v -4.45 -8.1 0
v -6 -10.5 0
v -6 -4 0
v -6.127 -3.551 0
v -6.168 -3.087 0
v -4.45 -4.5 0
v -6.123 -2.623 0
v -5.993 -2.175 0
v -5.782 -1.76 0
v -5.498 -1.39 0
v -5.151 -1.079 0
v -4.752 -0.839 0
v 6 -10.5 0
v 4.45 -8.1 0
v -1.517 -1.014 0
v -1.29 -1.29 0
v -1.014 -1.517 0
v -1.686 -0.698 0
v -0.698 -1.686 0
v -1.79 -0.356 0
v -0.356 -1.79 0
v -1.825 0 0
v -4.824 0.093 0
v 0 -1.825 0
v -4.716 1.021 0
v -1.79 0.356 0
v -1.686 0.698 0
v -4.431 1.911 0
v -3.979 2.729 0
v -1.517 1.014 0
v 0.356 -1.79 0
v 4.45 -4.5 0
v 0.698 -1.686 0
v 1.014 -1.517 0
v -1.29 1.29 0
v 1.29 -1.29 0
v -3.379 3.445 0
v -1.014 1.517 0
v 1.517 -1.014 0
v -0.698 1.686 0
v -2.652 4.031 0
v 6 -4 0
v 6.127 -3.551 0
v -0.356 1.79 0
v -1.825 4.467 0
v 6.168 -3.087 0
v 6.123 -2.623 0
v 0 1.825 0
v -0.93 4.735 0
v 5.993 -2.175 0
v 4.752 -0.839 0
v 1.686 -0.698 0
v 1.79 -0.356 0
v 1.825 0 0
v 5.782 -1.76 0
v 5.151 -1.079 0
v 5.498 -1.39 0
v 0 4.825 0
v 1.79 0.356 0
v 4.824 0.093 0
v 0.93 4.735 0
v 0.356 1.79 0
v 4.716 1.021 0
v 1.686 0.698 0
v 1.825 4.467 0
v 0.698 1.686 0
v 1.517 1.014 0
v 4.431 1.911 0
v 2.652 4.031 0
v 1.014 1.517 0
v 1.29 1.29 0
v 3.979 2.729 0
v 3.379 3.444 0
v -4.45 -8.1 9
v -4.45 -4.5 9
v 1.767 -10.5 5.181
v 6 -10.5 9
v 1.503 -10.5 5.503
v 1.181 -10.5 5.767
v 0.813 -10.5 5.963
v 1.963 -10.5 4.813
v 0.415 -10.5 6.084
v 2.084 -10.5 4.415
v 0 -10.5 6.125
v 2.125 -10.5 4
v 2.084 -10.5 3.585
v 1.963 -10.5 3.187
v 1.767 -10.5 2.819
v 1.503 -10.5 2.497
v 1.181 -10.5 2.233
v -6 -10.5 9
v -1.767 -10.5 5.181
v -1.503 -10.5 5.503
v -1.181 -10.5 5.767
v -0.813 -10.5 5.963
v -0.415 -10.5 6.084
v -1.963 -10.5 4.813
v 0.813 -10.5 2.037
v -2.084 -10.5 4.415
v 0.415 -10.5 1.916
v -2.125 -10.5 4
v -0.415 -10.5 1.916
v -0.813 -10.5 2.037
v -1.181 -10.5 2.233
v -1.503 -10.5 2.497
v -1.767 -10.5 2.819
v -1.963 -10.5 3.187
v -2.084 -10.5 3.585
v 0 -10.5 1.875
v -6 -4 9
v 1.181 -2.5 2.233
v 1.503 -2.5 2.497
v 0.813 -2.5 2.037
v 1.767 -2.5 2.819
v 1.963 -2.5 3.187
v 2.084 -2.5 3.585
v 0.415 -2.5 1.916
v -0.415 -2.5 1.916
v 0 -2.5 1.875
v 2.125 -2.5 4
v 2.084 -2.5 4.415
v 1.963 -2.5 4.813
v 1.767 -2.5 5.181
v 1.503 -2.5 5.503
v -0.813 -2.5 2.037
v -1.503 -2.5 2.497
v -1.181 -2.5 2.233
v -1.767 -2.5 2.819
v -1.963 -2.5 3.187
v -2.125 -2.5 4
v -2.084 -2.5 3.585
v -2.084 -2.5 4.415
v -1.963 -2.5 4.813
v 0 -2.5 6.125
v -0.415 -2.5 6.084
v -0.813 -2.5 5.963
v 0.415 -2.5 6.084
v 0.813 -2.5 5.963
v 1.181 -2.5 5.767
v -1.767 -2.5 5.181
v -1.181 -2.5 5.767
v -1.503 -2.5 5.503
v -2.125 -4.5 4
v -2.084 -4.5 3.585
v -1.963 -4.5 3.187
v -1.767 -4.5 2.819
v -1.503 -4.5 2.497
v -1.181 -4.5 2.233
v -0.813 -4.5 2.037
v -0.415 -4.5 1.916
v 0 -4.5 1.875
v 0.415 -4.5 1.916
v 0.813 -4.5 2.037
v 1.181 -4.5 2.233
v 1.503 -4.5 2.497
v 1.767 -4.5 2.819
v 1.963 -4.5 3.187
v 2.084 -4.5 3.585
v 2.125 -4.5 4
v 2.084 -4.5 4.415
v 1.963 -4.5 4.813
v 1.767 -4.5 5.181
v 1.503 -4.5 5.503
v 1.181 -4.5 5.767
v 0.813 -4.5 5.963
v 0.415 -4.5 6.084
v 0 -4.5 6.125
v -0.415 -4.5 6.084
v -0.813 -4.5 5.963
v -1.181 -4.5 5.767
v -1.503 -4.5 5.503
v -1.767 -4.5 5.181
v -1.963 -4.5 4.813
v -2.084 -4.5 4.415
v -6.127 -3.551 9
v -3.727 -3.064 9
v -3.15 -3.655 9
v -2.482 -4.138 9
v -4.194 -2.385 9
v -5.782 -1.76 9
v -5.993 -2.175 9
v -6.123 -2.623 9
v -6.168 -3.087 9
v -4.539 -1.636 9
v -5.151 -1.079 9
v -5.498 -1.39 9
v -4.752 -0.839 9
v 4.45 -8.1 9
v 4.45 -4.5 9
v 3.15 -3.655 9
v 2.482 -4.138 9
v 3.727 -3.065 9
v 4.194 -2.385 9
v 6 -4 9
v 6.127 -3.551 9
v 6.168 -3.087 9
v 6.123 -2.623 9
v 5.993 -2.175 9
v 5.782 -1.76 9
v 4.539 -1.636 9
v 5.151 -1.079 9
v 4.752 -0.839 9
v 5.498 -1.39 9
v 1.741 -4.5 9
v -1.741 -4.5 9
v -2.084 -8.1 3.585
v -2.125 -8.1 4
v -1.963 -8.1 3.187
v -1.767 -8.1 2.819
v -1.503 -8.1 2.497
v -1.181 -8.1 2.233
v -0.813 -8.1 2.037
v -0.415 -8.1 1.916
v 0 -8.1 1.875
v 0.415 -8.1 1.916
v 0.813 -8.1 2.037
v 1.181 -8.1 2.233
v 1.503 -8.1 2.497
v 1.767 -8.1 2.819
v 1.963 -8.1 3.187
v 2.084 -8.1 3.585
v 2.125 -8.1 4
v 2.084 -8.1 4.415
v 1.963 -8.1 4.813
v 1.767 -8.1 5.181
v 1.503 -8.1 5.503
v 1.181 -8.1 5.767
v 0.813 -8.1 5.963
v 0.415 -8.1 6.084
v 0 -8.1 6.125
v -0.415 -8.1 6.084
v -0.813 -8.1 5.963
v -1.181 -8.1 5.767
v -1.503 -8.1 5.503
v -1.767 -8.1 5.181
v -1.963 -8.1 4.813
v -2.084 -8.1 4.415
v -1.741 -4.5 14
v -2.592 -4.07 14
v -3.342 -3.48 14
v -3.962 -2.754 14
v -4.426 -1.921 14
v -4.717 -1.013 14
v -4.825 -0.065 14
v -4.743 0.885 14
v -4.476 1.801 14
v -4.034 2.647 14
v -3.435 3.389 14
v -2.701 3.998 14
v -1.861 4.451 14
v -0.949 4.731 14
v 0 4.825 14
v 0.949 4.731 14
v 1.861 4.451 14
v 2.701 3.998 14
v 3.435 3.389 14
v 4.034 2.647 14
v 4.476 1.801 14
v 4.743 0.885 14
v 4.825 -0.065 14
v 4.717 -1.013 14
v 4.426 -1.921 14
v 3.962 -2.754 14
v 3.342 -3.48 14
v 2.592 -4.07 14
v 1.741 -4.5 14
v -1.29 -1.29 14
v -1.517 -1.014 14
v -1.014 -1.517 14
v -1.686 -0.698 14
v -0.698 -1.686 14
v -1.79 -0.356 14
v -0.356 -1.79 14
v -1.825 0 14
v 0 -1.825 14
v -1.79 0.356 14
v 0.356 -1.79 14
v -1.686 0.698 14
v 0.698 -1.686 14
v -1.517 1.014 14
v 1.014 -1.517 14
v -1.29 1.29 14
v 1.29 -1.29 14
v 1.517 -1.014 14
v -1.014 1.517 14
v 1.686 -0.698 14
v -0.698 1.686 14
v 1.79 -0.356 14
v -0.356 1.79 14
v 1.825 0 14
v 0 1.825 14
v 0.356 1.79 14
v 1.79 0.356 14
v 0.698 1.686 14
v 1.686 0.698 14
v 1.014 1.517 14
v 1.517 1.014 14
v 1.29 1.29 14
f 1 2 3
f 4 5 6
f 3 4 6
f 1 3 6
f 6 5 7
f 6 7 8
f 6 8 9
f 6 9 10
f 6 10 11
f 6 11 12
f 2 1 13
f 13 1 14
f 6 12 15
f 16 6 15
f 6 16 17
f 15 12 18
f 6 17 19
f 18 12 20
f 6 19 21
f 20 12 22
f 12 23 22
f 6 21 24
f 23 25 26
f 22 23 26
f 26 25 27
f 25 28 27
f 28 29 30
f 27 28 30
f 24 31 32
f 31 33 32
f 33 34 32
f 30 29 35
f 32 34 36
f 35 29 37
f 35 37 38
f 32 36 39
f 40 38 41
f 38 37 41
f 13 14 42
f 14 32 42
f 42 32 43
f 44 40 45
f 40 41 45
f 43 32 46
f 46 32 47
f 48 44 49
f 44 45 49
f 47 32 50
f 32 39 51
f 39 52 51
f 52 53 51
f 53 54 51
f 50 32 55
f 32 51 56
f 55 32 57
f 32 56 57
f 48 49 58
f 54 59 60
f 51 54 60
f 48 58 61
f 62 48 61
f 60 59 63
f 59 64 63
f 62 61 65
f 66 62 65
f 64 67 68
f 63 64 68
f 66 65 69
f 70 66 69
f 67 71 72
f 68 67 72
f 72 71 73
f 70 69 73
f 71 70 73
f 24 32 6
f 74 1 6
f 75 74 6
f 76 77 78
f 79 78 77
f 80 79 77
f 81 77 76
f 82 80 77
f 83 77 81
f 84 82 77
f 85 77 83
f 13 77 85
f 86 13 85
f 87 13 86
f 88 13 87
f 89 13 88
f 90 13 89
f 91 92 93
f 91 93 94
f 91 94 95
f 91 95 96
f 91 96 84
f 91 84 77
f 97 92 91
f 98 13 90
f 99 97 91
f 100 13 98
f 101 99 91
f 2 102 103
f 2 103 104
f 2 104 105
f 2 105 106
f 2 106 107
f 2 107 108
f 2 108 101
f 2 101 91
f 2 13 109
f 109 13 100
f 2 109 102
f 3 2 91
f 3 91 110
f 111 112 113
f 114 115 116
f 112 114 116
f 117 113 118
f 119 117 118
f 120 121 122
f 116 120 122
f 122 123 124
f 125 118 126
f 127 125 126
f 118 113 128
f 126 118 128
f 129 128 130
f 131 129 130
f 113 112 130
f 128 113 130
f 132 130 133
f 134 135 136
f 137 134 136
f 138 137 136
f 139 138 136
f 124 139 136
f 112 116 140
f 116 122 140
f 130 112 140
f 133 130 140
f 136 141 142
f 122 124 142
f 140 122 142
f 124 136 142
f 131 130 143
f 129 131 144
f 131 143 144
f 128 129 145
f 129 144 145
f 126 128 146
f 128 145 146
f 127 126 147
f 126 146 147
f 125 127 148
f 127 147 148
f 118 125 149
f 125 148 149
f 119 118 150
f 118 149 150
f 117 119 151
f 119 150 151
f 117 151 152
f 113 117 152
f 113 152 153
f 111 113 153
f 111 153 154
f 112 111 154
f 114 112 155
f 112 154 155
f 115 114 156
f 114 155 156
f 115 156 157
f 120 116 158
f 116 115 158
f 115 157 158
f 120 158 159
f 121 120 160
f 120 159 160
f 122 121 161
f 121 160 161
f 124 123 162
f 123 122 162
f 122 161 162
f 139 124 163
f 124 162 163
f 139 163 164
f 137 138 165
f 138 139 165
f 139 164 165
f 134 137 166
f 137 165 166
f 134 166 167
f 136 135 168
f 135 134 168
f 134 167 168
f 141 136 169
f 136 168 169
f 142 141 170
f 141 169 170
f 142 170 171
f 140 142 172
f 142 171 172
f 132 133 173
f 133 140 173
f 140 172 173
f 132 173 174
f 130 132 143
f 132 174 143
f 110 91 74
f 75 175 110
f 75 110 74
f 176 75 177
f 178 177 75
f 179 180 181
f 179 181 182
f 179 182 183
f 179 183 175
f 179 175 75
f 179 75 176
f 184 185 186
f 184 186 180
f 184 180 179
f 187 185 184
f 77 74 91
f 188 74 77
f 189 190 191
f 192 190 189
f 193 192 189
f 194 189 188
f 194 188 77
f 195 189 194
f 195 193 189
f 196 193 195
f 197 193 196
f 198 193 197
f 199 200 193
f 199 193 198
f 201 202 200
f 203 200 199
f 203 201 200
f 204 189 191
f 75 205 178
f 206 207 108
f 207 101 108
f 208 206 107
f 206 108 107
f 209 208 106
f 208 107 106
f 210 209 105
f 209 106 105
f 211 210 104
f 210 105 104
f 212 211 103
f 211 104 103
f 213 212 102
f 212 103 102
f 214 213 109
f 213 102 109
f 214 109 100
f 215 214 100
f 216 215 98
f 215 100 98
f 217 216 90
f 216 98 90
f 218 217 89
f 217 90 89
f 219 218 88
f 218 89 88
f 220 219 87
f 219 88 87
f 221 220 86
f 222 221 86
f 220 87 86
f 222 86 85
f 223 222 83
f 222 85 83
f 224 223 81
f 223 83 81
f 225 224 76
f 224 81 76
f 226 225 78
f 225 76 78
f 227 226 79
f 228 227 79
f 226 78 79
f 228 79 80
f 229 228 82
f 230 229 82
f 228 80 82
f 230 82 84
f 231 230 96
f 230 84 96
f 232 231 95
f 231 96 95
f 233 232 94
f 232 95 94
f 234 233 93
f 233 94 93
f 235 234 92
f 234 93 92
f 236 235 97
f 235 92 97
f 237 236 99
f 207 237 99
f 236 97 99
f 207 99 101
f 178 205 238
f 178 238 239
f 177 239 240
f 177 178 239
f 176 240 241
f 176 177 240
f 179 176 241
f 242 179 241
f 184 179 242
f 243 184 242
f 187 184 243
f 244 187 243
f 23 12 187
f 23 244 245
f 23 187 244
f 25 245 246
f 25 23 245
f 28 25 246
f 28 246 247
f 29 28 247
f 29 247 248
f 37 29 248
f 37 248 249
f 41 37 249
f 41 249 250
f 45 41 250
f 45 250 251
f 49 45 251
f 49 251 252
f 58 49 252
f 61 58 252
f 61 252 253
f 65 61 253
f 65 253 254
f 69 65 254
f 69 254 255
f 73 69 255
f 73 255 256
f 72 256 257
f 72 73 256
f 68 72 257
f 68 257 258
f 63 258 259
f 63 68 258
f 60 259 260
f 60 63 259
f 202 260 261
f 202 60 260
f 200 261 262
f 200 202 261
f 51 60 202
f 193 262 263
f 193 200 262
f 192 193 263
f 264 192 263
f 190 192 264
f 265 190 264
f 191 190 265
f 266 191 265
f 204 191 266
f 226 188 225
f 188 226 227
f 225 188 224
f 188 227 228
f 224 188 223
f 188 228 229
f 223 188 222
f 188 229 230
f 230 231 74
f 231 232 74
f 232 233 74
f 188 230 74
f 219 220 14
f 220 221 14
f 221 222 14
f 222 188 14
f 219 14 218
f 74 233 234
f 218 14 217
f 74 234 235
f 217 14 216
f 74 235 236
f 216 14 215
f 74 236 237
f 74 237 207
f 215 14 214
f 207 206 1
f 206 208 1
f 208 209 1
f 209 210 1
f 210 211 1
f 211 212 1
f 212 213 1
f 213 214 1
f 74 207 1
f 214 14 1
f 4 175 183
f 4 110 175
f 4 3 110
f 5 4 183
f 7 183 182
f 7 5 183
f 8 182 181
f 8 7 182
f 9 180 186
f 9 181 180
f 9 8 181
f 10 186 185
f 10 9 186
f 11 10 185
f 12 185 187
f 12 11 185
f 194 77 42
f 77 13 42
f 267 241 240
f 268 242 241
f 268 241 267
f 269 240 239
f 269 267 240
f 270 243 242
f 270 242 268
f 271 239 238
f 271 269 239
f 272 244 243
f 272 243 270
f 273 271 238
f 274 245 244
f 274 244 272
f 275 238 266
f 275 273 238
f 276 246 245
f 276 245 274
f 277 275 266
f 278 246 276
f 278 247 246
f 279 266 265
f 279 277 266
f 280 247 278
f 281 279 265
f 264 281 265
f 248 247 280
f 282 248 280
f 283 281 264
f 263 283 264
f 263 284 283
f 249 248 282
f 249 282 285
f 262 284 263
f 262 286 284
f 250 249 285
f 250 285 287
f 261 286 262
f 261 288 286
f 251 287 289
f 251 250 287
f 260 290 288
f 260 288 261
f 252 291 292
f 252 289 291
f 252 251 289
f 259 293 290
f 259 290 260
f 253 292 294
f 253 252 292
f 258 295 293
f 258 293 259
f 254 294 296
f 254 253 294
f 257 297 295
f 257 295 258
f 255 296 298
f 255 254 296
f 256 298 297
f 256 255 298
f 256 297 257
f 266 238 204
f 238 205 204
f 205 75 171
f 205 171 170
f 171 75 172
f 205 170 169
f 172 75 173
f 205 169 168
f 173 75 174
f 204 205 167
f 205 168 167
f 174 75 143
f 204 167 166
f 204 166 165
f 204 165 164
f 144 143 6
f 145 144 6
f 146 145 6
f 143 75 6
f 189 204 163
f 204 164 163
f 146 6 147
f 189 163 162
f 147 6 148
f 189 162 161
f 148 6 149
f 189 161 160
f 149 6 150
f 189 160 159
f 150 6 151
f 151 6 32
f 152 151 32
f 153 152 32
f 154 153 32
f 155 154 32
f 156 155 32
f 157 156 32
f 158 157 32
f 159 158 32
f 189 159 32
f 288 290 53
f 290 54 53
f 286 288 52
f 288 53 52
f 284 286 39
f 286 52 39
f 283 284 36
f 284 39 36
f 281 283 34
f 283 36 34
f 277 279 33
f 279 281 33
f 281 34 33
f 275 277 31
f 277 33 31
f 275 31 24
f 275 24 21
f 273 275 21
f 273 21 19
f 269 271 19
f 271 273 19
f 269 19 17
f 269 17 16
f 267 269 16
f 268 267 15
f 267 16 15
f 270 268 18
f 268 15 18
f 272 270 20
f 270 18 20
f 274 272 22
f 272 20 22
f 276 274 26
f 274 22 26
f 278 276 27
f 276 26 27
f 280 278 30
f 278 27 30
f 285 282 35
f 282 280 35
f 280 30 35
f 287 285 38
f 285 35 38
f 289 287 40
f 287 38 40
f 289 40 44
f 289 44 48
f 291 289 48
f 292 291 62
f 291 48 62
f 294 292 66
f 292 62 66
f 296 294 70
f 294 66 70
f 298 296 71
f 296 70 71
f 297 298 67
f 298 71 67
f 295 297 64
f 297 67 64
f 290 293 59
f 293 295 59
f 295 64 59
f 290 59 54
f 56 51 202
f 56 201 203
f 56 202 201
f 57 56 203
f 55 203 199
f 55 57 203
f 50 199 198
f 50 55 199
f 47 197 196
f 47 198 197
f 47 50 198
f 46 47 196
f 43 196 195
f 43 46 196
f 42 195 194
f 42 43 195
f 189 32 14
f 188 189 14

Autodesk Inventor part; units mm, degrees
ref_plane "YZ Plane" through (0, 0, 0) normal (1, 0, 0) x (0, 1, 0)
ref_plane "XY Plane" through (0, 0, 0) normal (0, 0, 1) x (1, 0, 0)
sketch "Sketch1" plane through (0, 0, 0) normal (0, 0, 1) x (1, 0, 0)
  circle A0 centre (0, 0) radius 1.825
  circle A1 centre (0, 0) radius 4.825
  line L0 (-6, -4) -> (6, -4)
  line L1 (6, -10.5) -> (-6, -10.5)
  line L2 (-6, -10.5) -> (-6, -4)
  arc A2 (-2.3662, -0.949) -> (-6, -4) centre (-3.6609, -3.0965) ccw
  arc A3 (6, -4) -> (2.3662, -0.949) centre (3.6609, -3.0965) ccw
  arc A4 (-2.3662, -0.949) -> (2.3662, -0.949) centre (0, 0.4878) ccw
  line L3 (-15.4666, 0) -> (16.043, 0) construction
  line L4 (0, 8.2762) -> (0, -10.4238) construction
  line L5 (6, -10.5) -> (6, -4)
  dimension "d0" = 3.65
  dimension "d1" = 3
  dimension "d3" = 12
  dimension "d5" = 4
  dimension "d6" = 6.5
  dimension "d7" = 6
extrude "Extrusion1" add sketch "Sketch1" along normal blind 9
ref_plane "Work Plane1" through (0, -10.5, 0) normal (0, 1, 0) x (-1, 0, 0)
extrude "Extrusion4" add sketch "Sketch1" along normal blind 14 contours A1 A3 A4 A2 | A2 A4 A3 A1 L0 | L0 A1
sketch "Sketch2" plane through (0, -10.5, 0) normal (0, 1, 0) x (-1, 0, 0)
  line L0 (6, 0) -> (-6, 0) projected
  line L1 (-6, 0) -> (-6, 9) projected
  line L2 (6, 9) -> (-6, 9) projected
  line L3 (6, 0) -> (6, 9) projected
  circle A0 centre (0, 4) radius 2.125
  point P0 (0, 0)
  dimension "d11" = 4.25
  dimension "d12" = 4
extrude "Extrusion2" cut sketch "Sketch2" along normal blind 8 contours A0
sketch "Sketch3" plane through (0, 0, 9) normal (0, 0, 1) x (1, 0, 0)
  line L0 (-6, -10.5) -> (6, -10.5) projected
  circle A0 centre (0, 0) radius 1.825 projected
  line L1 (-4.45, -4.5) -> (4.45, -4.5)
  line L2 (4.45, -4.5) -> (4.45, -8.1)
  line L3 (4.45, -8.1) -> (-4.45, -8.1)
  line L4 (-4.45, -8.1) -> (-4.45, -4.5)
  point P0 (0, -8.1)
  point P1 (0, -10.5)
  dimension "d15" = 8.9
  dimension "d16" = 3.6
  dimension "d17" = 4.5
extrude "Extrusion3" cut sketch "Sketch3" along normal mid plane 30 contours L1 L2 L3 L4
equation "\"d4\" = 0.4"
properties part number "MotorAttachment2"
